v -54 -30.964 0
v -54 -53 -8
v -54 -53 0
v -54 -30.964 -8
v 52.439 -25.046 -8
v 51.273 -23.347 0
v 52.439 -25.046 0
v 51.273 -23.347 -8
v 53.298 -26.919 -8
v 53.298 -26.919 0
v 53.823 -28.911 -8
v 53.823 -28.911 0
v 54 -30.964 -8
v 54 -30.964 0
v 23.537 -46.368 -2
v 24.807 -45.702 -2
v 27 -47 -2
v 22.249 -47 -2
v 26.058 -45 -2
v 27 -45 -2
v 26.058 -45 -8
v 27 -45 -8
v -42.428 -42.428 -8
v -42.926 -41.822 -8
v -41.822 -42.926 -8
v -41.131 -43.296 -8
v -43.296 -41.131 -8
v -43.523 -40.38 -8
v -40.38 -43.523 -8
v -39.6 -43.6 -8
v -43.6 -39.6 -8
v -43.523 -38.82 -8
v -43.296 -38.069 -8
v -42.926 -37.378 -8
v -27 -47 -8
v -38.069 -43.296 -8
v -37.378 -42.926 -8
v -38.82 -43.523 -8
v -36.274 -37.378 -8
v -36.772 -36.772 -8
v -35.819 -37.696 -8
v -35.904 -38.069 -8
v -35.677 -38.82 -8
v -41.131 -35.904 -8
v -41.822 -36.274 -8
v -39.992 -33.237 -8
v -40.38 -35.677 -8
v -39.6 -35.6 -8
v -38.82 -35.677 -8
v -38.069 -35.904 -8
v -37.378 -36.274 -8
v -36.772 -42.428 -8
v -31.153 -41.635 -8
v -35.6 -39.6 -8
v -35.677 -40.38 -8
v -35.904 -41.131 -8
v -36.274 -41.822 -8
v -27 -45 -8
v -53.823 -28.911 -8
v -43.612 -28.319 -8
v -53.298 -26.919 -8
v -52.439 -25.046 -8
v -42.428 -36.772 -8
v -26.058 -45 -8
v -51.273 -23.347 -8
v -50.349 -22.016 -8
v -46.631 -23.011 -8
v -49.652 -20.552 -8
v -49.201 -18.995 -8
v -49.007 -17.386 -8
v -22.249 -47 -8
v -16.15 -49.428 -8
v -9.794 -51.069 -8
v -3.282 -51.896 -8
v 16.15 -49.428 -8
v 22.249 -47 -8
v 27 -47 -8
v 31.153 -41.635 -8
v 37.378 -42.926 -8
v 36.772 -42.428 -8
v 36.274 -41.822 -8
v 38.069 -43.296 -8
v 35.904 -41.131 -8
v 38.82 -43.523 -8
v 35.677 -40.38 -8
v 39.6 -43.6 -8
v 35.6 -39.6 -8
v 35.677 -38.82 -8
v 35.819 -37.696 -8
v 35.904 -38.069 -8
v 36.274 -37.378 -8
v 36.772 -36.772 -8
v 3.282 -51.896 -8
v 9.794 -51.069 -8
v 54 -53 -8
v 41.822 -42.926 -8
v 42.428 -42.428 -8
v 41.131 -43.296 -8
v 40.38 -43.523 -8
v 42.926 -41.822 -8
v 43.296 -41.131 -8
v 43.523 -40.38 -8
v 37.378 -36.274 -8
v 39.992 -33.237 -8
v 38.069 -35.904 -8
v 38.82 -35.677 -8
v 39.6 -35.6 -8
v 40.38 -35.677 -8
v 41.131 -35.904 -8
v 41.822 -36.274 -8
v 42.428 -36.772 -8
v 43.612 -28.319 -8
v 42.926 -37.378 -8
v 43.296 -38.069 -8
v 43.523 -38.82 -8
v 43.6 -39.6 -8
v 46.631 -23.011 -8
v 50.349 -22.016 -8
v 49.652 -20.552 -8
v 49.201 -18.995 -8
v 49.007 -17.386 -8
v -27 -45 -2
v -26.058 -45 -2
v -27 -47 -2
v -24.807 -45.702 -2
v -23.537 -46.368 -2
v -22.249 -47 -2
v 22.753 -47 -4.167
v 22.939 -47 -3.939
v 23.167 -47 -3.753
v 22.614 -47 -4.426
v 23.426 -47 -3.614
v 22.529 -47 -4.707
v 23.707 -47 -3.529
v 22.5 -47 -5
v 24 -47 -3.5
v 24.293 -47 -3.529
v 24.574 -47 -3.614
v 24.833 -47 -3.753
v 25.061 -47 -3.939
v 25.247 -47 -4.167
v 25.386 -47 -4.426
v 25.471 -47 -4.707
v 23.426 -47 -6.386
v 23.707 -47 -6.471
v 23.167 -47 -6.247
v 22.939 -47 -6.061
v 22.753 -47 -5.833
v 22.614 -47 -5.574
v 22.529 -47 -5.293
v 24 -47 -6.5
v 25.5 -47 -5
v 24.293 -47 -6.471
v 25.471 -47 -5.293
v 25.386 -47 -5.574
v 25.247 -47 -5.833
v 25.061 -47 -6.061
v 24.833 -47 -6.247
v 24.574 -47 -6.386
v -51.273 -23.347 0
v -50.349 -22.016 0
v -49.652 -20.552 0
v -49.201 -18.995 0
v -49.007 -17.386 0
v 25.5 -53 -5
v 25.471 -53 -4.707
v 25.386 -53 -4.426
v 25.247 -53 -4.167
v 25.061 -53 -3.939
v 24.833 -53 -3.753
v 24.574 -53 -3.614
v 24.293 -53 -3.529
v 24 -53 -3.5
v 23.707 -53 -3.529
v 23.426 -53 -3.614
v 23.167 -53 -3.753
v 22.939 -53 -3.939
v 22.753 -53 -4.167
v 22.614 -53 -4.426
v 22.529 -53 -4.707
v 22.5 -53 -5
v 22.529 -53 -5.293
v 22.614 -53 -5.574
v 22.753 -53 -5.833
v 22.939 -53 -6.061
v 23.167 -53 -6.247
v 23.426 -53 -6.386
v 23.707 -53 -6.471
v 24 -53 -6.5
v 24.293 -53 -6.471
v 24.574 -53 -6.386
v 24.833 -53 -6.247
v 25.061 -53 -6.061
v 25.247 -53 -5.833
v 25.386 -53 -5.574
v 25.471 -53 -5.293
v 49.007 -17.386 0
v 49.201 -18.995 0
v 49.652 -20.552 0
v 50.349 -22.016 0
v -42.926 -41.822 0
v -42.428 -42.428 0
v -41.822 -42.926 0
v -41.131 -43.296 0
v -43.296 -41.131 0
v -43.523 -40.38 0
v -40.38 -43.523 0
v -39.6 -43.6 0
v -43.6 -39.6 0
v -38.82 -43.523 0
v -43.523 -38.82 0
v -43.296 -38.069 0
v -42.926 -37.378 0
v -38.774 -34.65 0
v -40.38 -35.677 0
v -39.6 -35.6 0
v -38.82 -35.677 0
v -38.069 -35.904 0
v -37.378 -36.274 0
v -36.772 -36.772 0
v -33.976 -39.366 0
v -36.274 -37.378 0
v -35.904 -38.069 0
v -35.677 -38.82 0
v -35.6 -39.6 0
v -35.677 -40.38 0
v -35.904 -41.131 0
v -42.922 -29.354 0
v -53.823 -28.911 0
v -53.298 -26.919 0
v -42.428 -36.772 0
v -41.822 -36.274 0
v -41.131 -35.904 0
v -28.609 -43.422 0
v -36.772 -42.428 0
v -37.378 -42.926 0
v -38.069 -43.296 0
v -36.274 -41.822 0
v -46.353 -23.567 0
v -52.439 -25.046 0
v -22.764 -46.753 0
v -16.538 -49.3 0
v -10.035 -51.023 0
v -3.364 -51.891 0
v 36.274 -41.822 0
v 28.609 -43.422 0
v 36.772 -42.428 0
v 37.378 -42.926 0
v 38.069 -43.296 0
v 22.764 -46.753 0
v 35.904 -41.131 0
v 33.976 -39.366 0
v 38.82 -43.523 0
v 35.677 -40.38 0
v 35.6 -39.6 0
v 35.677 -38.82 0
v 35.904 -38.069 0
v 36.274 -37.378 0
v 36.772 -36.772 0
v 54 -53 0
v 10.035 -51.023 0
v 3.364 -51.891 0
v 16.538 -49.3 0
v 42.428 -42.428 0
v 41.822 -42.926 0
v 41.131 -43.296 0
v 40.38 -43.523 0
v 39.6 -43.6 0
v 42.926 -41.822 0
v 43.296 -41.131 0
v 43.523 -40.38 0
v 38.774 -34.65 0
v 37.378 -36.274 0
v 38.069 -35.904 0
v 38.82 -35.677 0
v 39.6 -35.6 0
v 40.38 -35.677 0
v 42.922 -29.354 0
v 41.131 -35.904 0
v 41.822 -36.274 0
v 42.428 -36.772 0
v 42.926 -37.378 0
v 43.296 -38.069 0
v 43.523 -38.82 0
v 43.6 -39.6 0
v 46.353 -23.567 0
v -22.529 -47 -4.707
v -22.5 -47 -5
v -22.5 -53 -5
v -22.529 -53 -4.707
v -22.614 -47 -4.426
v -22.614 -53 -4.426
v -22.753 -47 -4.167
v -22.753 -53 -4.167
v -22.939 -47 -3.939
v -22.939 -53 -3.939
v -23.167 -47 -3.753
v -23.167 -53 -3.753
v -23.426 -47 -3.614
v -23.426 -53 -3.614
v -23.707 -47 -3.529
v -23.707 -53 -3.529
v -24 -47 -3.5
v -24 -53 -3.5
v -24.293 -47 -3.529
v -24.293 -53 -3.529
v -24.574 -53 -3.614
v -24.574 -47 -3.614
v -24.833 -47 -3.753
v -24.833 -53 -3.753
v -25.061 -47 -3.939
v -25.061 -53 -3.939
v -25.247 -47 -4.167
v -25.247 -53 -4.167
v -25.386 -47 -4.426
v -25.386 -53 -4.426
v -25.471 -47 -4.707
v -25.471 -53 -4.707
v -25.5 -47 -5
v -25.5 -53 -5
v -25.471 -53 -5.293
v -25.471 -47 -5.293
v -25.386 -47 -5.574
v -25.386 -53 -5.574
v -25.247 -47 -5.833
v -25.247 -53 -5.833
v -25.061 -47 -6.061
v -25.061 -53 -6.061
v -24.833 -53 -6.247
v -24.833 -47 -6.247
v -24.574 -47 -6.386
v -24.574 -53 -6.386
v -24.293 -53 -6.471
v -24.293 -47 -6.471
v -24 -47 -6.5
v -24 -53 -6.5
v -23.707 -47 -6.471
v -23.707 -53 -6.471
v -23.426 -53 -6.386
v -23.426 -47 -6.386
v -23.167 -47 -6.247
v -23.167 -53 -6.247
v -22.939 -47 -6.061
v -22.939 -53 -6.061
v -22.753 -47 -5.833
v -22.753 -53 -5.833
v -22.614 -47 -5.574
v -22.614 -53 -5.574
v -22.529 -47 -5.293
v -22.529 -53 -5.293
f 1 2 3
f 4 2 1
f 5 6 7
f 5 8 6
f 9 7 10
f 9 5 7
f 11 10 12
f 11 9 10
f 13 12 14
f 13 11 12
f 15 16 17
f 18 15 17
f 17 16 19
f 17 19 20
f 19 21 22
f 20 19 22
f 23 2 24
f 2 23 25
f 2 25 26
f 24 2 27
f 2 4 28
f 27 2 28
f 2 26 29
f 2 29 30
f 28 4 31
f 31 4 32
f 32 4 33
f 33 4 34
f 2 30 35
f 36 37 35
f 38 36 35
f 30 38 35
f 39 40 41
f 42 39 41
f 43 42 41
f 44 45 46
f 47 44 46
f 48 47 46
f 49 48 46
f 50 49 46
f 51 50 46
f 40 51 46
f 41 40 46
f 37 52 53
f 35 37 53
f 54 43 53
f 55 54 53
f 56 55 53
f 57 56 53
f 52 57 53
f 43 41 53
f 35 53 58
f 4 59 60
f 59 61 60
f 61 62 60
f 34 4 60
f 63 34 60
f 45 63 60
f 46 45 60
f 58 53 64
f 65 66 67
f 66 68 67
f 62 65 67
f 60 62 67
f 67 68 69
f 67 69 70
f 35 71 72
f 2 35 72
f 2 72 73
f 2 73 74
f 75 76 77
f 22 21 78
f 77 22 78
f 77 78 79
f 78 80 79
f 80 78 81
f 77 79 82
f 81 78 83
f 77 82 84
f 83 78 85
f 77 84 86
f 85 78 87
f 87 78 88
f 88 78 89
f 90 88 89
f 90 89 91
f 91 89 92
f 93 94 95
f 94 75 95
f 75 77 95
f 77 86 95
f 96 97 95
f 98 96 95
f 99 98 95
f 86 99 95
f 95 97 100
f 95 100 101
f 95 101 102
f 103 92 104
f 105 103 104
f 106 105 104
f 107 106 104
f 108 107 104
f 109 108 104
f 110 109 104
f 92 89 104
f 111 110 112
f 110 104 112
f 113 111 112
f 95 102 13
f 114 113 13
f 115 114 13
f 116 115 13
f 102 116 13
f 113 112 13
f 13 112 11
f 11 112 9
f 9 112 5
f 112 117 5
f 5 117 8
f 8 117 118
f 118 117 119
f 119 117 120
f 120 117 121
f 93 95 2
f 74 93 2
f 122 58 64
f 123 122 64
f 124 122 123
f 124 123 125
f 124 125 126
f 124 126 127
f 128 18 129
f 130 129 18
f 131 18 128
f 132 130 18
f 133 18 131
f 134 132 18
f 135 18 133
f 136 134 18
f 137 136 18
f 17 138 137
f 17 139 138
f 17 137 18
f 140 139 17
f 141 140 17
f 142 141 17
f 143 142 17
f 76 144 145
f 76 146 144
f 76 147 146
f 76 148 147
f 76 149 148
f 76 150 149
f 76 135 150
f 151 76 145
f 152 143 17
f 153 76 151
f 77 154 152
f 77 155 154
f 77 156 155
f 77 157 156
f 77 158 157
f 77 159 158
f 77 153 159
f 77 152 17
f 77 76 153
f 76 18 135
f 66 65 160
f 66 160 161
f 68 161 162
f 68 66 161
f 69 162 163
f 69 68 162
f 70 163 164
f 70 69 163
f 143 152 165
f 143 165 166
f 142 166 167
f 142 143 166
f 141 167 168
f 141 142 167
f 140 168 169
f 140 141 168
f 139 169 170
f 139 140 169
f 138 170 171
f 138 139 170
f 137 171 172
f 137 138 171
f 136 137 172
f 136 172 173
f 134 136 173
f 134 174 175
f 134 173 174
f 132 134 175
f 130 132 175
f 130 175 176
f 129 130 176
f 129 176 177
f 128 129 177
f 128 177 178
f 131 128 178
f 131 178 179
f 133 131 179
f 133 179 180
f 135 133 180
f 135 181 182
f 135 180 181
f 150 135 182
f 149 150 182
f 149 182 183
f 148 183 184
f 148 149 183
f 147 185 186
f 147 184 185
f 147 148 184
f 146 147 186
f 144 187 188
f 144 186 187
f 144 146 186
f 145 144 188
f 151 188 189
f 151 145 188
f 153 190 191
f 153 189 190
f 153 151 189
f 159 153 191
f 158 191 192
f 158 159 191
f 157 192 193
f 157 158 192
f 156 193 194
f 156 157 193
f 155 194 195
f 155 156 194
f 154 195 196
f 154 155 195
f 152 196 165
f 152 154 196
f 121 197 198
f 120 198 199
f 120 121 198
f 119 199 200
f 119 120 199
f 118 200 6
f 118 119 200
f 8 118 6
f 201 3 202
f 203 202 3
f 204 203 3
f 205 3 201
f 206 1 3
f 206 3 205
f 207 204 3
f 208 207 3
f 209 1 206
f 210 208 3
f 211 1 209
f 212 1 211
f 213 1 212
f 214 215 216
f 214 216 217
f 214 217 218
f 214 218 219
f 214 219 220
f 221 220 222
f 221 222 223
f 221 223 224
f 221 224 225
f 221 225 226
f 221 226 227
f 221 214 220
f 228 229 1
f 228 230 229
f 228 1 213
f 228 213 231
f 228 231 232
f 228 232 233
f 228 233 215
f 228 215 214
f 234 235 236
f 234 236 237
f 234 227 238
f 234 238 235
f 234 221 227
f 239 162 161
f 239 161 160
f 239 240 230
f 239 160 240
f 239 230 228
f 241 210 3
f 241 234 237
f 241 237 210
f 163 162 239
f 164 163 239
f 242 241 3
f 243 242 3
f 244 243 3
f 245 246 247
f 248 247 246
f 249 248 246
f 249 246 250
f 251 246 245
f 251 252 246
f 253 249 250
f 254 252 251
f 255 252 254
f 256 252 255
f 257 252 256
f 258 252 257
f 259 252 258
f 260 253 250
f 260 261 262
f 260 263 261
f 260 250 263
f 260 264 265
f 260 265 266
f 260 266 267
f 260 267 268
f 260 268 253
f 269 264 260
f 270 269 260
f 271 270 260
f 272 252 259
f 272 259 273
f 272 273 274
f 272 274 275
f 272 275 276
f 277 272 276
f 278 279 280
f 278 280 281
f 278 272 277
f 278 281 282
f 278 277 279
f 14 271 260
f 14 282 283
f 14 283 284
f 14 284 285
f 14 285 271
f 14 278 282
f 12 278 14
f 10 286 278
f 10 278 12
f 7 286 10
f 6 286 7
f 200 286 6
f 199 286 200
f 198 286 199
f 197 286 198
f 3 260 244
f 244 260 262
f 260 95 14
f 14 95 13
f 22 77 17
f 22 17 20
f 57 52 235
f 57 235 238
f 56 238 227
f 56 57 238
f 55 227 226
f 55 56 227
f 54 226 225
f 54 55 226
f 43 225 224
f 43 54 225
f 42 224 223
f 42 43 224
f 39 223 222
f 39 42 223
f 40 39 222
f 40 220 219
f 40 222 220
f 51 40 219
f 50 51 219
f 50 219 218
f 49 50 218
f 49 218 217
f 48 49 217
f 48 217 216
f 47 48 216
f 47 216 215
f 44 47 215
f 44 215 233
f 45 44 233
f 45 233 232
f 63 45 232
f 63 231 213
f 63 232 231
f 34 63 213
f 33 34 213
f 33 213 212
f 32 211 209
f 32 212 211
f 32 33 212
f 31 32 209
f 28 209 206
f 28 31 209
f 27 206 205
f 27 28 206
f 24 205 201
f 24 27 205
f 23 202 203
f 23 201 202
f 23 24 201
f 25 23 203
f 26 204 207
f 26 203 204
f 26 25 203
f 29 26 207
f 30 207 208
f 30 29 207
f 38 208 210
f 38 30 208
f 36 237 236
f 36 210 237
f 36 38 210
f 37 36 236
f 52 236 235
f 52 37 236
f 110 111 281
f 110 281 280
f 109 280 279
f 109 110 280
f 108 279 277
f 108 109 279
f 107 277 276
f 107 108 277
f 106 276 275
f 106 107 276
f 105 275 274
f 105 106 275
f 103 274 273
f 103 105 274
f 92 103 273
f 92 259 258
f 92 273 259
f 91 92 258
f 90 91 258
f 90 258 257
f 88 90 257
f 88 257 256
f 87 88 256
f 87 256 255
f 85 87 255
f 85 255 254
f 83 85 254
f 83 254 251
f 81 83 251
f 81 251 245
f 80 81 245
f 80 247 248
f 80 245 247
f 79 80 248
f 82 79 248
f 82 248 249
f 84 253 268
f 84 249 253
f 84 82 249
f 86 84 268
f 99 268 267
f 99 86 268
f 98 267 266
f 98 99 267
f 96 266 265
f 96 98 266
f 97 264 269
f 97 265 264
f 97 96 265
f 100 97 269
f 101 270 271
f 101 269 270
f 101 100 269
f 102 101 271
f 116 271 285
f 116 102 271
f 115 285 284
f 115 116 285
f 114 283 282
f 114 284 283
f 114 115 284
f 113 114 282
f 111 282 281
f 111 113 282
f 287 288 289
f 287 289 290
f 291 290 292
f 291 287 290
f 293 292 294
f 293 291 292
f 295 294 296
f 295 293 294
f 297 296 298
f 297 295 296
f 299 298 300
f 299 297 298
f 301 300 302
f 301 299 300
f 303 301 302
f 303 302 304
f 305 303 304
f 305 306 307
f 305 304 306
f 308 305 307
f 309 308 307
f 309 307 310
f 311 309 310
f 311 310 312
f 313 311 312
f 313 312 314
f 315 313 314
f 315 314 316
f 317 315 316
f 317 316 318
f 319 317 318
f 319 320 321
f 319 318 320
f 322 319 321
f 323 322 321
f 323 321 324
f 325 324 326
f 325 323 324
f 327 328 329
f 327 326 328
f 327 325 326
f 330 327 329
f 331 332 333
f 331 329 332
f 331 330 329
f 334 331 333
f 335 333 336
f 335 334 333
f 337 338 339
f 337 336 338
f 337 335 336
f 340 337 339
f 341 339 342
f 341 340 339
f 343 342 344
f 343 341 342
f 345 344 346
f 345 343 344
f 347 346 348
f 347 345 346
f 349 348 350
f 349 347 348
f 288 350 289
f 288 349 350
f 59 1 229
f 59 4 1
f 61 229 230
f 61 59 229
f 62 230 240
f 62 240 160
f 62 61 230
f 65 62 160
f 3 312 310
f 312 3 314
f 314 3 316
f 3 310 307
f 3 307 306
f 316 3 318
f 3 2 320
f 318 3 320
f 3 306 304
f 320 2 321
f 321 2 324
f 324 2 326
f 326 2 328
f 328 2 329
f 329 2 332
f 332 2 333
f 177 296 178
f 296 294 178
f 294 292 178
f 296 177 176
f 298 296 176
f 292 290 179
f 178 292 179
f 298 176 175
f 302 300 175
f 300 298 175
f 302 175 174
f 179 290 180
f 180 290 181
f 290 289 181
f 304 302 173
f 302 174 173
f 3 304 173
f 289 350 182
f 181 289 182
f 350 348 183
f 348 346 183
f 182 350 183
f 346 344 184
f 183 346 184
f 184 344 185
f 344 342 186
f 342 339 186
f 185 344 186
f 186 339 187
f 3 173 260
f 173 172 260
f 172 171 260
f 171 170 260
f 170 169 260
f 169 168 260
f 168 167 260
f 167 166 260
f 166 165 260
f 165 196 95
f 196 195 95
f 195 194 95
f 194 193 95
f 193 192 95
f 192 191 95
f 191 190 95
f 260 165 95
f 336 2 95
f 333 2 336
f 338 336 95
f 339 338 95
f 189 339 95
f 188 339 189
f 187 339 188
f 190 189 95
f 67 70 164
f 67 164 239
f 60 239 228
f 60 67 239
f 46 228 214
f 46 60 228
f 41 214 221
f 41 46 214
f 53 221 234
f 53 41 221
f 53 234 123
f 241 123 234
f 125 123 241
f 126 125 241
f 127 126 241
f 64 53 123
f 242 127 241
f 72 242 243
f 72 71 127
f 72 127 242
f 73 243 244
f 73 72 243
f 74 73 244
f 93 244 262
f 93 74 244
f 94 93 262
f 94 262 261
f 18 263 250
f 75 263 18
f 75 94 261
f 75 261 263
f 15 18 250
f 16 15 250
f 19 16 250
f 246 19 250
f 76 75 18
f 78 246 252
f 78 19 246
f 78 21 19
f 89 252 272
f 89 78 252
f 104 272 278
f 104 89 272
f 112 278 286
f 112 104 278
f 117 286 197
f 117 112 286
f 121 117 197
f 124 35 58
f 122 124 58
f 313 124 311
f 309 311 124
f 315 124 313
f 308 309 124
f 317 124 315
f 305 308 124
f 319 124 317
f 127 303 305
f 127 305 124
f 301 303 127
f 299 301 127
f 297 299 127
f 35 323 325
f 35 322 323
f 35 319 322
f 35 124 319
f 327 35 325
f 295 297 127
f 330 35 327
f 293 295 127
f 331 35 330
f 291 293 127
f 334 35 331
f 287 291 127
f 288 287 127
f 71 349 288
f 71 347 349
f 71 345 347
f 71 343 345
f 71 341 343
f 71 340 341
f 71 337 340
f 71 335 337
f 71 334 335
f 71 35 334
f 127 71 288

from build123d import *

# Parameters (mm, degrees)
CYLINDER883_R               = 1.5
CYLINDER883_DEPTH           = 20
CYLINDER884_R               = 1.5
CYLINDER884_DEPTH           = 20
CYLINDER881_R               = 1.5
CYLINDER881_DEPTH           = 20
CYLINDER885_R               = 1.5
CYLINDER885_DEPTH           = 20
BOX399_W                    = 6
BOX399_H                    = 2
BOX399_DEPTH                = 6
BOX401_W                    = 6
BOX401_H                    = 2
BOX401_DEPTH                = 6
BOX398_W                    = 6
BOX398_H                    = 2
BOX398_DEPTH                = 6
BOX402_W                    = 6
BOX402_H                    = 2
BOX402_DEPTH                = 6
CYLINDER882_R               = 4
CYLINDER882_DEPTH           = 20
CYLINDER882_PLACEMENT_ANGLE = 45
CYLINDER877_R               = 4
CYLINDER877_DEPTH           = 20
CYLINDER877_PLACEMENT_ANGLE = 45
CYLINDER880_R               = 10
CYLINDER880_DEPTH           = 40
CYLINDER878_R               = 10
CYLINDER878_DEPTH           = 40
CYLINDER879_R               = 52
CYLINDER879_DEPTH           = 8
BOX403_W                    = 108
BOX403_H                    = 36
BOX403_DEPTH                = 8
FILLET014_R                 = 12


with BuildPart() as v_lec883:
    # Cylinder883 → Cylinder883 (new body)
    with BuildSketch(Plane(origin=(24, -40, -5), x_dir=(1, 0, 0), z_dir=(0, -1, 0))):
        Circle(CYLINDER883_R)
    extrude(amount=CYLINDER883_DEPTH)


with BuildPart() as v_lec884:
    # Cylinder884 → Cylinder884 (new body)
    with BuildSketch(Plane(origin=(51, -40, 7), x_dir=(1, 0, 0), z_dir=(0, -1, 0))):
        Circle(CYLINDER884_R)
    extrude(amount=CYLINDER884_DEPTH)


with BuildPart() as v_lec881:
    # Cylinder881 → Cylinder881 (new body)
    with BuildSketch(Plane(origin=(-51, -40, 7), x_dir=(1, 0, 0), z_dir=(0, -1, 0))):
        Circle(CYLINDER881_R)
    extrude(amount=CYLINDER881_DEPTH)


with BuildPart() as compound773:
    # Cylinder885 → Cylinder885 (new body)
    with BuildSketch(Plane(origin=(-24, -40, -5), x_dir=(1, 0, 0), z_dir=(0, -1, 0))):
        Circle(CYLINDER885_R)
    extrude(amount=CYLINDER885_DEPTH)

    # Compound773: union Válec883, Válec884, Válec881
    add(v_lec883.part)
    add(v_lec884.part)
    add(v_lec881.part)


with BuildPart() as krychle399:
    # Box399 → Box399 (new body)
    with BuildSketch(Plane(origin=(21, -47, -8), x_dir=(1, 0, 0), z_dir=(0, 0, 1))):
        with Locations((3, 1)):
            Rectangle(BOX399_W, BOX399_H)
    extrude(amount=BOX399_DEPTH)


with BuildPart() as krychle401:
    # Box401 → Box401 (new body)
    with BuildSketch(Plane(origin=(48, -45, 4), x_dir=(1, 0, 0), z_dir=(0, 0, 1))):
        with Locations((3, 1)):
            Rectangle(BOX401_W, BOX401_H)
    extrude(amount=BOX401_DEPTH)


with BuildPart() as krychle398:
    # Box398 → Box398 (new body)
    with BuildSketch(Plane(origin=(-54, -45, 4), x_dir=(1, 0, 0), z_dir=(0, 0, 1))):
        with Locations((3, 1)):
            Rectangle(BOX398_W, BOX398_H)
    extrude(amount=BOX398_DEPTH)


with BuildPart() as compound772:
    # Box402 → Box402 (new body)
    with BuildSketch(Plane(origin=(-27, -47, -8), x_dir=(1, 0, 0), z_dir=(0, 0, 1))):
        with Locations((3, 1)):
            Rectangle(BOX402_W, BOX402_H)
    extrude(amount=BOX402_DEPTH)

    # Compound772: union Krychle399, Krychle401, Krychle398
    add(krychle399.part)
    add(krychle401.part)
    add(krychle398.part)


with BuildPart() as v_lec882:
    # Cylinder882 → Cylinder882 (new body)
    with BuildSketch(Plane.XY):
        Circle(CYLINDER882_R)
    extrude(amount=CYLINDER882_DEPTH)


with BuildPart() as v_lec882_1:
    # Cylinder882 placement: moved
    add(v_lec882.part.moved(Location((39.6, -39.6, -10))).rotate(Axis((39.6, -39.6, -10), (0, 0, 1)), CYLINDER882_PLACEMENT_ANGLE))


with BuildPart() as compound775:
    # Cylinder877 → Cylinder877 (new body)
    with BuildSketch(Plane.XY):
        Circle(CYLINDER877_R)
    extrude(amount=CYLINDER877_DEPTH)


with BuildPart() as compound775_1:
    # Cylinder877 placement: moved
    add(compound775.part.moved(Location((-39.6, -39.6, -10))).rotate(Axis((-39.6, -39.6, -10), (0, 0, -1)), CYLINDER877_PLACEMENT_ANGLE))

    # Compound775: union Válec882
    add(v_lec882_1.part)


with BuildPart() as v_lec880:
    # Cylinder880 → Cylinder880 (new body)
    with BuildSketch(Plane(origin=(-59, -17, 0), x_dir=(1, 0, 0), z_dir=(0, 0, 1))):
        Circle(CYLINDER880_R)
    extrude(amount=CYLINDER880_DEPTH)


with BuildPart() as compound774:
    # Cylinder878 → Cylinder878 (new body)
    with BuildSketch(Plane(origin=(59, -17, 0), x_dir=(1, 0, 0), z_dir=(0, 0, 1))):
        Circle(CYLINDER878_R)
    extrude(amount=CYLINDER878_DEPTH)

    # Compound774: union Válec880
    add(v_lec880.part)


with BuildPart() as v_lec879:
    # Cylinder879 → Cylinder879 (new body)
    with BuildSketch(Plane.XY.offset(20)):
        Circle(CYLINDER879_R)
    extrude(amount=CYLINDER879_DEPTH)


with BuildPart() as fillet014:
    # Box403 → Box403 (new body)
    with BuildSketch(Plane(origin=(-54, -53, 20), x_dir=(1, 0, 0), z_dir=(0, 0, 1))):
        with Locations((54, 18)):
            Rectangle(BOX403_W, BOX403_H)
    extrude(amount=BOX403_DEPTH)

    # Cut400: cut Válec879
    add(v_lec879.part, mode=Mode.SUBTRACT)


with BuildPart() as fillet014_1:
    # Cut400 placement: moved
    add(fillet014.part.moved(Location((0, 0, -20))))

    # Cut403: cut Compound774
    add(compound774.part, mode=Mode.SUBTRACT)


with BuildPart() as fillet014_2:
    # Cut403 placement: moved
    add(fillet014_1.part.moved(Location((0, 0, -8))))

    # Cut401: cut Compound775
    add(compound775_1.part, mode=Mode.SUBTRACT)

    # Cut402: cut Compound772
    add(compound772.part, mode=Mode.SUBTRACT)

    # Cut399: cut Compound773
    add(compound773.part, mode=Mode.SUBTRACT)

    # Fillet014
    fillet014_edges = [fillet014_2.edges().sort_by_distance(p)[0] for p in [
        (-54, -25.660254, -4),
        (54, -25.660254, -4),
    ]]
    fillet(fillet014_edges, radius=FILLET014_R)


solid = fillet014_2.part
